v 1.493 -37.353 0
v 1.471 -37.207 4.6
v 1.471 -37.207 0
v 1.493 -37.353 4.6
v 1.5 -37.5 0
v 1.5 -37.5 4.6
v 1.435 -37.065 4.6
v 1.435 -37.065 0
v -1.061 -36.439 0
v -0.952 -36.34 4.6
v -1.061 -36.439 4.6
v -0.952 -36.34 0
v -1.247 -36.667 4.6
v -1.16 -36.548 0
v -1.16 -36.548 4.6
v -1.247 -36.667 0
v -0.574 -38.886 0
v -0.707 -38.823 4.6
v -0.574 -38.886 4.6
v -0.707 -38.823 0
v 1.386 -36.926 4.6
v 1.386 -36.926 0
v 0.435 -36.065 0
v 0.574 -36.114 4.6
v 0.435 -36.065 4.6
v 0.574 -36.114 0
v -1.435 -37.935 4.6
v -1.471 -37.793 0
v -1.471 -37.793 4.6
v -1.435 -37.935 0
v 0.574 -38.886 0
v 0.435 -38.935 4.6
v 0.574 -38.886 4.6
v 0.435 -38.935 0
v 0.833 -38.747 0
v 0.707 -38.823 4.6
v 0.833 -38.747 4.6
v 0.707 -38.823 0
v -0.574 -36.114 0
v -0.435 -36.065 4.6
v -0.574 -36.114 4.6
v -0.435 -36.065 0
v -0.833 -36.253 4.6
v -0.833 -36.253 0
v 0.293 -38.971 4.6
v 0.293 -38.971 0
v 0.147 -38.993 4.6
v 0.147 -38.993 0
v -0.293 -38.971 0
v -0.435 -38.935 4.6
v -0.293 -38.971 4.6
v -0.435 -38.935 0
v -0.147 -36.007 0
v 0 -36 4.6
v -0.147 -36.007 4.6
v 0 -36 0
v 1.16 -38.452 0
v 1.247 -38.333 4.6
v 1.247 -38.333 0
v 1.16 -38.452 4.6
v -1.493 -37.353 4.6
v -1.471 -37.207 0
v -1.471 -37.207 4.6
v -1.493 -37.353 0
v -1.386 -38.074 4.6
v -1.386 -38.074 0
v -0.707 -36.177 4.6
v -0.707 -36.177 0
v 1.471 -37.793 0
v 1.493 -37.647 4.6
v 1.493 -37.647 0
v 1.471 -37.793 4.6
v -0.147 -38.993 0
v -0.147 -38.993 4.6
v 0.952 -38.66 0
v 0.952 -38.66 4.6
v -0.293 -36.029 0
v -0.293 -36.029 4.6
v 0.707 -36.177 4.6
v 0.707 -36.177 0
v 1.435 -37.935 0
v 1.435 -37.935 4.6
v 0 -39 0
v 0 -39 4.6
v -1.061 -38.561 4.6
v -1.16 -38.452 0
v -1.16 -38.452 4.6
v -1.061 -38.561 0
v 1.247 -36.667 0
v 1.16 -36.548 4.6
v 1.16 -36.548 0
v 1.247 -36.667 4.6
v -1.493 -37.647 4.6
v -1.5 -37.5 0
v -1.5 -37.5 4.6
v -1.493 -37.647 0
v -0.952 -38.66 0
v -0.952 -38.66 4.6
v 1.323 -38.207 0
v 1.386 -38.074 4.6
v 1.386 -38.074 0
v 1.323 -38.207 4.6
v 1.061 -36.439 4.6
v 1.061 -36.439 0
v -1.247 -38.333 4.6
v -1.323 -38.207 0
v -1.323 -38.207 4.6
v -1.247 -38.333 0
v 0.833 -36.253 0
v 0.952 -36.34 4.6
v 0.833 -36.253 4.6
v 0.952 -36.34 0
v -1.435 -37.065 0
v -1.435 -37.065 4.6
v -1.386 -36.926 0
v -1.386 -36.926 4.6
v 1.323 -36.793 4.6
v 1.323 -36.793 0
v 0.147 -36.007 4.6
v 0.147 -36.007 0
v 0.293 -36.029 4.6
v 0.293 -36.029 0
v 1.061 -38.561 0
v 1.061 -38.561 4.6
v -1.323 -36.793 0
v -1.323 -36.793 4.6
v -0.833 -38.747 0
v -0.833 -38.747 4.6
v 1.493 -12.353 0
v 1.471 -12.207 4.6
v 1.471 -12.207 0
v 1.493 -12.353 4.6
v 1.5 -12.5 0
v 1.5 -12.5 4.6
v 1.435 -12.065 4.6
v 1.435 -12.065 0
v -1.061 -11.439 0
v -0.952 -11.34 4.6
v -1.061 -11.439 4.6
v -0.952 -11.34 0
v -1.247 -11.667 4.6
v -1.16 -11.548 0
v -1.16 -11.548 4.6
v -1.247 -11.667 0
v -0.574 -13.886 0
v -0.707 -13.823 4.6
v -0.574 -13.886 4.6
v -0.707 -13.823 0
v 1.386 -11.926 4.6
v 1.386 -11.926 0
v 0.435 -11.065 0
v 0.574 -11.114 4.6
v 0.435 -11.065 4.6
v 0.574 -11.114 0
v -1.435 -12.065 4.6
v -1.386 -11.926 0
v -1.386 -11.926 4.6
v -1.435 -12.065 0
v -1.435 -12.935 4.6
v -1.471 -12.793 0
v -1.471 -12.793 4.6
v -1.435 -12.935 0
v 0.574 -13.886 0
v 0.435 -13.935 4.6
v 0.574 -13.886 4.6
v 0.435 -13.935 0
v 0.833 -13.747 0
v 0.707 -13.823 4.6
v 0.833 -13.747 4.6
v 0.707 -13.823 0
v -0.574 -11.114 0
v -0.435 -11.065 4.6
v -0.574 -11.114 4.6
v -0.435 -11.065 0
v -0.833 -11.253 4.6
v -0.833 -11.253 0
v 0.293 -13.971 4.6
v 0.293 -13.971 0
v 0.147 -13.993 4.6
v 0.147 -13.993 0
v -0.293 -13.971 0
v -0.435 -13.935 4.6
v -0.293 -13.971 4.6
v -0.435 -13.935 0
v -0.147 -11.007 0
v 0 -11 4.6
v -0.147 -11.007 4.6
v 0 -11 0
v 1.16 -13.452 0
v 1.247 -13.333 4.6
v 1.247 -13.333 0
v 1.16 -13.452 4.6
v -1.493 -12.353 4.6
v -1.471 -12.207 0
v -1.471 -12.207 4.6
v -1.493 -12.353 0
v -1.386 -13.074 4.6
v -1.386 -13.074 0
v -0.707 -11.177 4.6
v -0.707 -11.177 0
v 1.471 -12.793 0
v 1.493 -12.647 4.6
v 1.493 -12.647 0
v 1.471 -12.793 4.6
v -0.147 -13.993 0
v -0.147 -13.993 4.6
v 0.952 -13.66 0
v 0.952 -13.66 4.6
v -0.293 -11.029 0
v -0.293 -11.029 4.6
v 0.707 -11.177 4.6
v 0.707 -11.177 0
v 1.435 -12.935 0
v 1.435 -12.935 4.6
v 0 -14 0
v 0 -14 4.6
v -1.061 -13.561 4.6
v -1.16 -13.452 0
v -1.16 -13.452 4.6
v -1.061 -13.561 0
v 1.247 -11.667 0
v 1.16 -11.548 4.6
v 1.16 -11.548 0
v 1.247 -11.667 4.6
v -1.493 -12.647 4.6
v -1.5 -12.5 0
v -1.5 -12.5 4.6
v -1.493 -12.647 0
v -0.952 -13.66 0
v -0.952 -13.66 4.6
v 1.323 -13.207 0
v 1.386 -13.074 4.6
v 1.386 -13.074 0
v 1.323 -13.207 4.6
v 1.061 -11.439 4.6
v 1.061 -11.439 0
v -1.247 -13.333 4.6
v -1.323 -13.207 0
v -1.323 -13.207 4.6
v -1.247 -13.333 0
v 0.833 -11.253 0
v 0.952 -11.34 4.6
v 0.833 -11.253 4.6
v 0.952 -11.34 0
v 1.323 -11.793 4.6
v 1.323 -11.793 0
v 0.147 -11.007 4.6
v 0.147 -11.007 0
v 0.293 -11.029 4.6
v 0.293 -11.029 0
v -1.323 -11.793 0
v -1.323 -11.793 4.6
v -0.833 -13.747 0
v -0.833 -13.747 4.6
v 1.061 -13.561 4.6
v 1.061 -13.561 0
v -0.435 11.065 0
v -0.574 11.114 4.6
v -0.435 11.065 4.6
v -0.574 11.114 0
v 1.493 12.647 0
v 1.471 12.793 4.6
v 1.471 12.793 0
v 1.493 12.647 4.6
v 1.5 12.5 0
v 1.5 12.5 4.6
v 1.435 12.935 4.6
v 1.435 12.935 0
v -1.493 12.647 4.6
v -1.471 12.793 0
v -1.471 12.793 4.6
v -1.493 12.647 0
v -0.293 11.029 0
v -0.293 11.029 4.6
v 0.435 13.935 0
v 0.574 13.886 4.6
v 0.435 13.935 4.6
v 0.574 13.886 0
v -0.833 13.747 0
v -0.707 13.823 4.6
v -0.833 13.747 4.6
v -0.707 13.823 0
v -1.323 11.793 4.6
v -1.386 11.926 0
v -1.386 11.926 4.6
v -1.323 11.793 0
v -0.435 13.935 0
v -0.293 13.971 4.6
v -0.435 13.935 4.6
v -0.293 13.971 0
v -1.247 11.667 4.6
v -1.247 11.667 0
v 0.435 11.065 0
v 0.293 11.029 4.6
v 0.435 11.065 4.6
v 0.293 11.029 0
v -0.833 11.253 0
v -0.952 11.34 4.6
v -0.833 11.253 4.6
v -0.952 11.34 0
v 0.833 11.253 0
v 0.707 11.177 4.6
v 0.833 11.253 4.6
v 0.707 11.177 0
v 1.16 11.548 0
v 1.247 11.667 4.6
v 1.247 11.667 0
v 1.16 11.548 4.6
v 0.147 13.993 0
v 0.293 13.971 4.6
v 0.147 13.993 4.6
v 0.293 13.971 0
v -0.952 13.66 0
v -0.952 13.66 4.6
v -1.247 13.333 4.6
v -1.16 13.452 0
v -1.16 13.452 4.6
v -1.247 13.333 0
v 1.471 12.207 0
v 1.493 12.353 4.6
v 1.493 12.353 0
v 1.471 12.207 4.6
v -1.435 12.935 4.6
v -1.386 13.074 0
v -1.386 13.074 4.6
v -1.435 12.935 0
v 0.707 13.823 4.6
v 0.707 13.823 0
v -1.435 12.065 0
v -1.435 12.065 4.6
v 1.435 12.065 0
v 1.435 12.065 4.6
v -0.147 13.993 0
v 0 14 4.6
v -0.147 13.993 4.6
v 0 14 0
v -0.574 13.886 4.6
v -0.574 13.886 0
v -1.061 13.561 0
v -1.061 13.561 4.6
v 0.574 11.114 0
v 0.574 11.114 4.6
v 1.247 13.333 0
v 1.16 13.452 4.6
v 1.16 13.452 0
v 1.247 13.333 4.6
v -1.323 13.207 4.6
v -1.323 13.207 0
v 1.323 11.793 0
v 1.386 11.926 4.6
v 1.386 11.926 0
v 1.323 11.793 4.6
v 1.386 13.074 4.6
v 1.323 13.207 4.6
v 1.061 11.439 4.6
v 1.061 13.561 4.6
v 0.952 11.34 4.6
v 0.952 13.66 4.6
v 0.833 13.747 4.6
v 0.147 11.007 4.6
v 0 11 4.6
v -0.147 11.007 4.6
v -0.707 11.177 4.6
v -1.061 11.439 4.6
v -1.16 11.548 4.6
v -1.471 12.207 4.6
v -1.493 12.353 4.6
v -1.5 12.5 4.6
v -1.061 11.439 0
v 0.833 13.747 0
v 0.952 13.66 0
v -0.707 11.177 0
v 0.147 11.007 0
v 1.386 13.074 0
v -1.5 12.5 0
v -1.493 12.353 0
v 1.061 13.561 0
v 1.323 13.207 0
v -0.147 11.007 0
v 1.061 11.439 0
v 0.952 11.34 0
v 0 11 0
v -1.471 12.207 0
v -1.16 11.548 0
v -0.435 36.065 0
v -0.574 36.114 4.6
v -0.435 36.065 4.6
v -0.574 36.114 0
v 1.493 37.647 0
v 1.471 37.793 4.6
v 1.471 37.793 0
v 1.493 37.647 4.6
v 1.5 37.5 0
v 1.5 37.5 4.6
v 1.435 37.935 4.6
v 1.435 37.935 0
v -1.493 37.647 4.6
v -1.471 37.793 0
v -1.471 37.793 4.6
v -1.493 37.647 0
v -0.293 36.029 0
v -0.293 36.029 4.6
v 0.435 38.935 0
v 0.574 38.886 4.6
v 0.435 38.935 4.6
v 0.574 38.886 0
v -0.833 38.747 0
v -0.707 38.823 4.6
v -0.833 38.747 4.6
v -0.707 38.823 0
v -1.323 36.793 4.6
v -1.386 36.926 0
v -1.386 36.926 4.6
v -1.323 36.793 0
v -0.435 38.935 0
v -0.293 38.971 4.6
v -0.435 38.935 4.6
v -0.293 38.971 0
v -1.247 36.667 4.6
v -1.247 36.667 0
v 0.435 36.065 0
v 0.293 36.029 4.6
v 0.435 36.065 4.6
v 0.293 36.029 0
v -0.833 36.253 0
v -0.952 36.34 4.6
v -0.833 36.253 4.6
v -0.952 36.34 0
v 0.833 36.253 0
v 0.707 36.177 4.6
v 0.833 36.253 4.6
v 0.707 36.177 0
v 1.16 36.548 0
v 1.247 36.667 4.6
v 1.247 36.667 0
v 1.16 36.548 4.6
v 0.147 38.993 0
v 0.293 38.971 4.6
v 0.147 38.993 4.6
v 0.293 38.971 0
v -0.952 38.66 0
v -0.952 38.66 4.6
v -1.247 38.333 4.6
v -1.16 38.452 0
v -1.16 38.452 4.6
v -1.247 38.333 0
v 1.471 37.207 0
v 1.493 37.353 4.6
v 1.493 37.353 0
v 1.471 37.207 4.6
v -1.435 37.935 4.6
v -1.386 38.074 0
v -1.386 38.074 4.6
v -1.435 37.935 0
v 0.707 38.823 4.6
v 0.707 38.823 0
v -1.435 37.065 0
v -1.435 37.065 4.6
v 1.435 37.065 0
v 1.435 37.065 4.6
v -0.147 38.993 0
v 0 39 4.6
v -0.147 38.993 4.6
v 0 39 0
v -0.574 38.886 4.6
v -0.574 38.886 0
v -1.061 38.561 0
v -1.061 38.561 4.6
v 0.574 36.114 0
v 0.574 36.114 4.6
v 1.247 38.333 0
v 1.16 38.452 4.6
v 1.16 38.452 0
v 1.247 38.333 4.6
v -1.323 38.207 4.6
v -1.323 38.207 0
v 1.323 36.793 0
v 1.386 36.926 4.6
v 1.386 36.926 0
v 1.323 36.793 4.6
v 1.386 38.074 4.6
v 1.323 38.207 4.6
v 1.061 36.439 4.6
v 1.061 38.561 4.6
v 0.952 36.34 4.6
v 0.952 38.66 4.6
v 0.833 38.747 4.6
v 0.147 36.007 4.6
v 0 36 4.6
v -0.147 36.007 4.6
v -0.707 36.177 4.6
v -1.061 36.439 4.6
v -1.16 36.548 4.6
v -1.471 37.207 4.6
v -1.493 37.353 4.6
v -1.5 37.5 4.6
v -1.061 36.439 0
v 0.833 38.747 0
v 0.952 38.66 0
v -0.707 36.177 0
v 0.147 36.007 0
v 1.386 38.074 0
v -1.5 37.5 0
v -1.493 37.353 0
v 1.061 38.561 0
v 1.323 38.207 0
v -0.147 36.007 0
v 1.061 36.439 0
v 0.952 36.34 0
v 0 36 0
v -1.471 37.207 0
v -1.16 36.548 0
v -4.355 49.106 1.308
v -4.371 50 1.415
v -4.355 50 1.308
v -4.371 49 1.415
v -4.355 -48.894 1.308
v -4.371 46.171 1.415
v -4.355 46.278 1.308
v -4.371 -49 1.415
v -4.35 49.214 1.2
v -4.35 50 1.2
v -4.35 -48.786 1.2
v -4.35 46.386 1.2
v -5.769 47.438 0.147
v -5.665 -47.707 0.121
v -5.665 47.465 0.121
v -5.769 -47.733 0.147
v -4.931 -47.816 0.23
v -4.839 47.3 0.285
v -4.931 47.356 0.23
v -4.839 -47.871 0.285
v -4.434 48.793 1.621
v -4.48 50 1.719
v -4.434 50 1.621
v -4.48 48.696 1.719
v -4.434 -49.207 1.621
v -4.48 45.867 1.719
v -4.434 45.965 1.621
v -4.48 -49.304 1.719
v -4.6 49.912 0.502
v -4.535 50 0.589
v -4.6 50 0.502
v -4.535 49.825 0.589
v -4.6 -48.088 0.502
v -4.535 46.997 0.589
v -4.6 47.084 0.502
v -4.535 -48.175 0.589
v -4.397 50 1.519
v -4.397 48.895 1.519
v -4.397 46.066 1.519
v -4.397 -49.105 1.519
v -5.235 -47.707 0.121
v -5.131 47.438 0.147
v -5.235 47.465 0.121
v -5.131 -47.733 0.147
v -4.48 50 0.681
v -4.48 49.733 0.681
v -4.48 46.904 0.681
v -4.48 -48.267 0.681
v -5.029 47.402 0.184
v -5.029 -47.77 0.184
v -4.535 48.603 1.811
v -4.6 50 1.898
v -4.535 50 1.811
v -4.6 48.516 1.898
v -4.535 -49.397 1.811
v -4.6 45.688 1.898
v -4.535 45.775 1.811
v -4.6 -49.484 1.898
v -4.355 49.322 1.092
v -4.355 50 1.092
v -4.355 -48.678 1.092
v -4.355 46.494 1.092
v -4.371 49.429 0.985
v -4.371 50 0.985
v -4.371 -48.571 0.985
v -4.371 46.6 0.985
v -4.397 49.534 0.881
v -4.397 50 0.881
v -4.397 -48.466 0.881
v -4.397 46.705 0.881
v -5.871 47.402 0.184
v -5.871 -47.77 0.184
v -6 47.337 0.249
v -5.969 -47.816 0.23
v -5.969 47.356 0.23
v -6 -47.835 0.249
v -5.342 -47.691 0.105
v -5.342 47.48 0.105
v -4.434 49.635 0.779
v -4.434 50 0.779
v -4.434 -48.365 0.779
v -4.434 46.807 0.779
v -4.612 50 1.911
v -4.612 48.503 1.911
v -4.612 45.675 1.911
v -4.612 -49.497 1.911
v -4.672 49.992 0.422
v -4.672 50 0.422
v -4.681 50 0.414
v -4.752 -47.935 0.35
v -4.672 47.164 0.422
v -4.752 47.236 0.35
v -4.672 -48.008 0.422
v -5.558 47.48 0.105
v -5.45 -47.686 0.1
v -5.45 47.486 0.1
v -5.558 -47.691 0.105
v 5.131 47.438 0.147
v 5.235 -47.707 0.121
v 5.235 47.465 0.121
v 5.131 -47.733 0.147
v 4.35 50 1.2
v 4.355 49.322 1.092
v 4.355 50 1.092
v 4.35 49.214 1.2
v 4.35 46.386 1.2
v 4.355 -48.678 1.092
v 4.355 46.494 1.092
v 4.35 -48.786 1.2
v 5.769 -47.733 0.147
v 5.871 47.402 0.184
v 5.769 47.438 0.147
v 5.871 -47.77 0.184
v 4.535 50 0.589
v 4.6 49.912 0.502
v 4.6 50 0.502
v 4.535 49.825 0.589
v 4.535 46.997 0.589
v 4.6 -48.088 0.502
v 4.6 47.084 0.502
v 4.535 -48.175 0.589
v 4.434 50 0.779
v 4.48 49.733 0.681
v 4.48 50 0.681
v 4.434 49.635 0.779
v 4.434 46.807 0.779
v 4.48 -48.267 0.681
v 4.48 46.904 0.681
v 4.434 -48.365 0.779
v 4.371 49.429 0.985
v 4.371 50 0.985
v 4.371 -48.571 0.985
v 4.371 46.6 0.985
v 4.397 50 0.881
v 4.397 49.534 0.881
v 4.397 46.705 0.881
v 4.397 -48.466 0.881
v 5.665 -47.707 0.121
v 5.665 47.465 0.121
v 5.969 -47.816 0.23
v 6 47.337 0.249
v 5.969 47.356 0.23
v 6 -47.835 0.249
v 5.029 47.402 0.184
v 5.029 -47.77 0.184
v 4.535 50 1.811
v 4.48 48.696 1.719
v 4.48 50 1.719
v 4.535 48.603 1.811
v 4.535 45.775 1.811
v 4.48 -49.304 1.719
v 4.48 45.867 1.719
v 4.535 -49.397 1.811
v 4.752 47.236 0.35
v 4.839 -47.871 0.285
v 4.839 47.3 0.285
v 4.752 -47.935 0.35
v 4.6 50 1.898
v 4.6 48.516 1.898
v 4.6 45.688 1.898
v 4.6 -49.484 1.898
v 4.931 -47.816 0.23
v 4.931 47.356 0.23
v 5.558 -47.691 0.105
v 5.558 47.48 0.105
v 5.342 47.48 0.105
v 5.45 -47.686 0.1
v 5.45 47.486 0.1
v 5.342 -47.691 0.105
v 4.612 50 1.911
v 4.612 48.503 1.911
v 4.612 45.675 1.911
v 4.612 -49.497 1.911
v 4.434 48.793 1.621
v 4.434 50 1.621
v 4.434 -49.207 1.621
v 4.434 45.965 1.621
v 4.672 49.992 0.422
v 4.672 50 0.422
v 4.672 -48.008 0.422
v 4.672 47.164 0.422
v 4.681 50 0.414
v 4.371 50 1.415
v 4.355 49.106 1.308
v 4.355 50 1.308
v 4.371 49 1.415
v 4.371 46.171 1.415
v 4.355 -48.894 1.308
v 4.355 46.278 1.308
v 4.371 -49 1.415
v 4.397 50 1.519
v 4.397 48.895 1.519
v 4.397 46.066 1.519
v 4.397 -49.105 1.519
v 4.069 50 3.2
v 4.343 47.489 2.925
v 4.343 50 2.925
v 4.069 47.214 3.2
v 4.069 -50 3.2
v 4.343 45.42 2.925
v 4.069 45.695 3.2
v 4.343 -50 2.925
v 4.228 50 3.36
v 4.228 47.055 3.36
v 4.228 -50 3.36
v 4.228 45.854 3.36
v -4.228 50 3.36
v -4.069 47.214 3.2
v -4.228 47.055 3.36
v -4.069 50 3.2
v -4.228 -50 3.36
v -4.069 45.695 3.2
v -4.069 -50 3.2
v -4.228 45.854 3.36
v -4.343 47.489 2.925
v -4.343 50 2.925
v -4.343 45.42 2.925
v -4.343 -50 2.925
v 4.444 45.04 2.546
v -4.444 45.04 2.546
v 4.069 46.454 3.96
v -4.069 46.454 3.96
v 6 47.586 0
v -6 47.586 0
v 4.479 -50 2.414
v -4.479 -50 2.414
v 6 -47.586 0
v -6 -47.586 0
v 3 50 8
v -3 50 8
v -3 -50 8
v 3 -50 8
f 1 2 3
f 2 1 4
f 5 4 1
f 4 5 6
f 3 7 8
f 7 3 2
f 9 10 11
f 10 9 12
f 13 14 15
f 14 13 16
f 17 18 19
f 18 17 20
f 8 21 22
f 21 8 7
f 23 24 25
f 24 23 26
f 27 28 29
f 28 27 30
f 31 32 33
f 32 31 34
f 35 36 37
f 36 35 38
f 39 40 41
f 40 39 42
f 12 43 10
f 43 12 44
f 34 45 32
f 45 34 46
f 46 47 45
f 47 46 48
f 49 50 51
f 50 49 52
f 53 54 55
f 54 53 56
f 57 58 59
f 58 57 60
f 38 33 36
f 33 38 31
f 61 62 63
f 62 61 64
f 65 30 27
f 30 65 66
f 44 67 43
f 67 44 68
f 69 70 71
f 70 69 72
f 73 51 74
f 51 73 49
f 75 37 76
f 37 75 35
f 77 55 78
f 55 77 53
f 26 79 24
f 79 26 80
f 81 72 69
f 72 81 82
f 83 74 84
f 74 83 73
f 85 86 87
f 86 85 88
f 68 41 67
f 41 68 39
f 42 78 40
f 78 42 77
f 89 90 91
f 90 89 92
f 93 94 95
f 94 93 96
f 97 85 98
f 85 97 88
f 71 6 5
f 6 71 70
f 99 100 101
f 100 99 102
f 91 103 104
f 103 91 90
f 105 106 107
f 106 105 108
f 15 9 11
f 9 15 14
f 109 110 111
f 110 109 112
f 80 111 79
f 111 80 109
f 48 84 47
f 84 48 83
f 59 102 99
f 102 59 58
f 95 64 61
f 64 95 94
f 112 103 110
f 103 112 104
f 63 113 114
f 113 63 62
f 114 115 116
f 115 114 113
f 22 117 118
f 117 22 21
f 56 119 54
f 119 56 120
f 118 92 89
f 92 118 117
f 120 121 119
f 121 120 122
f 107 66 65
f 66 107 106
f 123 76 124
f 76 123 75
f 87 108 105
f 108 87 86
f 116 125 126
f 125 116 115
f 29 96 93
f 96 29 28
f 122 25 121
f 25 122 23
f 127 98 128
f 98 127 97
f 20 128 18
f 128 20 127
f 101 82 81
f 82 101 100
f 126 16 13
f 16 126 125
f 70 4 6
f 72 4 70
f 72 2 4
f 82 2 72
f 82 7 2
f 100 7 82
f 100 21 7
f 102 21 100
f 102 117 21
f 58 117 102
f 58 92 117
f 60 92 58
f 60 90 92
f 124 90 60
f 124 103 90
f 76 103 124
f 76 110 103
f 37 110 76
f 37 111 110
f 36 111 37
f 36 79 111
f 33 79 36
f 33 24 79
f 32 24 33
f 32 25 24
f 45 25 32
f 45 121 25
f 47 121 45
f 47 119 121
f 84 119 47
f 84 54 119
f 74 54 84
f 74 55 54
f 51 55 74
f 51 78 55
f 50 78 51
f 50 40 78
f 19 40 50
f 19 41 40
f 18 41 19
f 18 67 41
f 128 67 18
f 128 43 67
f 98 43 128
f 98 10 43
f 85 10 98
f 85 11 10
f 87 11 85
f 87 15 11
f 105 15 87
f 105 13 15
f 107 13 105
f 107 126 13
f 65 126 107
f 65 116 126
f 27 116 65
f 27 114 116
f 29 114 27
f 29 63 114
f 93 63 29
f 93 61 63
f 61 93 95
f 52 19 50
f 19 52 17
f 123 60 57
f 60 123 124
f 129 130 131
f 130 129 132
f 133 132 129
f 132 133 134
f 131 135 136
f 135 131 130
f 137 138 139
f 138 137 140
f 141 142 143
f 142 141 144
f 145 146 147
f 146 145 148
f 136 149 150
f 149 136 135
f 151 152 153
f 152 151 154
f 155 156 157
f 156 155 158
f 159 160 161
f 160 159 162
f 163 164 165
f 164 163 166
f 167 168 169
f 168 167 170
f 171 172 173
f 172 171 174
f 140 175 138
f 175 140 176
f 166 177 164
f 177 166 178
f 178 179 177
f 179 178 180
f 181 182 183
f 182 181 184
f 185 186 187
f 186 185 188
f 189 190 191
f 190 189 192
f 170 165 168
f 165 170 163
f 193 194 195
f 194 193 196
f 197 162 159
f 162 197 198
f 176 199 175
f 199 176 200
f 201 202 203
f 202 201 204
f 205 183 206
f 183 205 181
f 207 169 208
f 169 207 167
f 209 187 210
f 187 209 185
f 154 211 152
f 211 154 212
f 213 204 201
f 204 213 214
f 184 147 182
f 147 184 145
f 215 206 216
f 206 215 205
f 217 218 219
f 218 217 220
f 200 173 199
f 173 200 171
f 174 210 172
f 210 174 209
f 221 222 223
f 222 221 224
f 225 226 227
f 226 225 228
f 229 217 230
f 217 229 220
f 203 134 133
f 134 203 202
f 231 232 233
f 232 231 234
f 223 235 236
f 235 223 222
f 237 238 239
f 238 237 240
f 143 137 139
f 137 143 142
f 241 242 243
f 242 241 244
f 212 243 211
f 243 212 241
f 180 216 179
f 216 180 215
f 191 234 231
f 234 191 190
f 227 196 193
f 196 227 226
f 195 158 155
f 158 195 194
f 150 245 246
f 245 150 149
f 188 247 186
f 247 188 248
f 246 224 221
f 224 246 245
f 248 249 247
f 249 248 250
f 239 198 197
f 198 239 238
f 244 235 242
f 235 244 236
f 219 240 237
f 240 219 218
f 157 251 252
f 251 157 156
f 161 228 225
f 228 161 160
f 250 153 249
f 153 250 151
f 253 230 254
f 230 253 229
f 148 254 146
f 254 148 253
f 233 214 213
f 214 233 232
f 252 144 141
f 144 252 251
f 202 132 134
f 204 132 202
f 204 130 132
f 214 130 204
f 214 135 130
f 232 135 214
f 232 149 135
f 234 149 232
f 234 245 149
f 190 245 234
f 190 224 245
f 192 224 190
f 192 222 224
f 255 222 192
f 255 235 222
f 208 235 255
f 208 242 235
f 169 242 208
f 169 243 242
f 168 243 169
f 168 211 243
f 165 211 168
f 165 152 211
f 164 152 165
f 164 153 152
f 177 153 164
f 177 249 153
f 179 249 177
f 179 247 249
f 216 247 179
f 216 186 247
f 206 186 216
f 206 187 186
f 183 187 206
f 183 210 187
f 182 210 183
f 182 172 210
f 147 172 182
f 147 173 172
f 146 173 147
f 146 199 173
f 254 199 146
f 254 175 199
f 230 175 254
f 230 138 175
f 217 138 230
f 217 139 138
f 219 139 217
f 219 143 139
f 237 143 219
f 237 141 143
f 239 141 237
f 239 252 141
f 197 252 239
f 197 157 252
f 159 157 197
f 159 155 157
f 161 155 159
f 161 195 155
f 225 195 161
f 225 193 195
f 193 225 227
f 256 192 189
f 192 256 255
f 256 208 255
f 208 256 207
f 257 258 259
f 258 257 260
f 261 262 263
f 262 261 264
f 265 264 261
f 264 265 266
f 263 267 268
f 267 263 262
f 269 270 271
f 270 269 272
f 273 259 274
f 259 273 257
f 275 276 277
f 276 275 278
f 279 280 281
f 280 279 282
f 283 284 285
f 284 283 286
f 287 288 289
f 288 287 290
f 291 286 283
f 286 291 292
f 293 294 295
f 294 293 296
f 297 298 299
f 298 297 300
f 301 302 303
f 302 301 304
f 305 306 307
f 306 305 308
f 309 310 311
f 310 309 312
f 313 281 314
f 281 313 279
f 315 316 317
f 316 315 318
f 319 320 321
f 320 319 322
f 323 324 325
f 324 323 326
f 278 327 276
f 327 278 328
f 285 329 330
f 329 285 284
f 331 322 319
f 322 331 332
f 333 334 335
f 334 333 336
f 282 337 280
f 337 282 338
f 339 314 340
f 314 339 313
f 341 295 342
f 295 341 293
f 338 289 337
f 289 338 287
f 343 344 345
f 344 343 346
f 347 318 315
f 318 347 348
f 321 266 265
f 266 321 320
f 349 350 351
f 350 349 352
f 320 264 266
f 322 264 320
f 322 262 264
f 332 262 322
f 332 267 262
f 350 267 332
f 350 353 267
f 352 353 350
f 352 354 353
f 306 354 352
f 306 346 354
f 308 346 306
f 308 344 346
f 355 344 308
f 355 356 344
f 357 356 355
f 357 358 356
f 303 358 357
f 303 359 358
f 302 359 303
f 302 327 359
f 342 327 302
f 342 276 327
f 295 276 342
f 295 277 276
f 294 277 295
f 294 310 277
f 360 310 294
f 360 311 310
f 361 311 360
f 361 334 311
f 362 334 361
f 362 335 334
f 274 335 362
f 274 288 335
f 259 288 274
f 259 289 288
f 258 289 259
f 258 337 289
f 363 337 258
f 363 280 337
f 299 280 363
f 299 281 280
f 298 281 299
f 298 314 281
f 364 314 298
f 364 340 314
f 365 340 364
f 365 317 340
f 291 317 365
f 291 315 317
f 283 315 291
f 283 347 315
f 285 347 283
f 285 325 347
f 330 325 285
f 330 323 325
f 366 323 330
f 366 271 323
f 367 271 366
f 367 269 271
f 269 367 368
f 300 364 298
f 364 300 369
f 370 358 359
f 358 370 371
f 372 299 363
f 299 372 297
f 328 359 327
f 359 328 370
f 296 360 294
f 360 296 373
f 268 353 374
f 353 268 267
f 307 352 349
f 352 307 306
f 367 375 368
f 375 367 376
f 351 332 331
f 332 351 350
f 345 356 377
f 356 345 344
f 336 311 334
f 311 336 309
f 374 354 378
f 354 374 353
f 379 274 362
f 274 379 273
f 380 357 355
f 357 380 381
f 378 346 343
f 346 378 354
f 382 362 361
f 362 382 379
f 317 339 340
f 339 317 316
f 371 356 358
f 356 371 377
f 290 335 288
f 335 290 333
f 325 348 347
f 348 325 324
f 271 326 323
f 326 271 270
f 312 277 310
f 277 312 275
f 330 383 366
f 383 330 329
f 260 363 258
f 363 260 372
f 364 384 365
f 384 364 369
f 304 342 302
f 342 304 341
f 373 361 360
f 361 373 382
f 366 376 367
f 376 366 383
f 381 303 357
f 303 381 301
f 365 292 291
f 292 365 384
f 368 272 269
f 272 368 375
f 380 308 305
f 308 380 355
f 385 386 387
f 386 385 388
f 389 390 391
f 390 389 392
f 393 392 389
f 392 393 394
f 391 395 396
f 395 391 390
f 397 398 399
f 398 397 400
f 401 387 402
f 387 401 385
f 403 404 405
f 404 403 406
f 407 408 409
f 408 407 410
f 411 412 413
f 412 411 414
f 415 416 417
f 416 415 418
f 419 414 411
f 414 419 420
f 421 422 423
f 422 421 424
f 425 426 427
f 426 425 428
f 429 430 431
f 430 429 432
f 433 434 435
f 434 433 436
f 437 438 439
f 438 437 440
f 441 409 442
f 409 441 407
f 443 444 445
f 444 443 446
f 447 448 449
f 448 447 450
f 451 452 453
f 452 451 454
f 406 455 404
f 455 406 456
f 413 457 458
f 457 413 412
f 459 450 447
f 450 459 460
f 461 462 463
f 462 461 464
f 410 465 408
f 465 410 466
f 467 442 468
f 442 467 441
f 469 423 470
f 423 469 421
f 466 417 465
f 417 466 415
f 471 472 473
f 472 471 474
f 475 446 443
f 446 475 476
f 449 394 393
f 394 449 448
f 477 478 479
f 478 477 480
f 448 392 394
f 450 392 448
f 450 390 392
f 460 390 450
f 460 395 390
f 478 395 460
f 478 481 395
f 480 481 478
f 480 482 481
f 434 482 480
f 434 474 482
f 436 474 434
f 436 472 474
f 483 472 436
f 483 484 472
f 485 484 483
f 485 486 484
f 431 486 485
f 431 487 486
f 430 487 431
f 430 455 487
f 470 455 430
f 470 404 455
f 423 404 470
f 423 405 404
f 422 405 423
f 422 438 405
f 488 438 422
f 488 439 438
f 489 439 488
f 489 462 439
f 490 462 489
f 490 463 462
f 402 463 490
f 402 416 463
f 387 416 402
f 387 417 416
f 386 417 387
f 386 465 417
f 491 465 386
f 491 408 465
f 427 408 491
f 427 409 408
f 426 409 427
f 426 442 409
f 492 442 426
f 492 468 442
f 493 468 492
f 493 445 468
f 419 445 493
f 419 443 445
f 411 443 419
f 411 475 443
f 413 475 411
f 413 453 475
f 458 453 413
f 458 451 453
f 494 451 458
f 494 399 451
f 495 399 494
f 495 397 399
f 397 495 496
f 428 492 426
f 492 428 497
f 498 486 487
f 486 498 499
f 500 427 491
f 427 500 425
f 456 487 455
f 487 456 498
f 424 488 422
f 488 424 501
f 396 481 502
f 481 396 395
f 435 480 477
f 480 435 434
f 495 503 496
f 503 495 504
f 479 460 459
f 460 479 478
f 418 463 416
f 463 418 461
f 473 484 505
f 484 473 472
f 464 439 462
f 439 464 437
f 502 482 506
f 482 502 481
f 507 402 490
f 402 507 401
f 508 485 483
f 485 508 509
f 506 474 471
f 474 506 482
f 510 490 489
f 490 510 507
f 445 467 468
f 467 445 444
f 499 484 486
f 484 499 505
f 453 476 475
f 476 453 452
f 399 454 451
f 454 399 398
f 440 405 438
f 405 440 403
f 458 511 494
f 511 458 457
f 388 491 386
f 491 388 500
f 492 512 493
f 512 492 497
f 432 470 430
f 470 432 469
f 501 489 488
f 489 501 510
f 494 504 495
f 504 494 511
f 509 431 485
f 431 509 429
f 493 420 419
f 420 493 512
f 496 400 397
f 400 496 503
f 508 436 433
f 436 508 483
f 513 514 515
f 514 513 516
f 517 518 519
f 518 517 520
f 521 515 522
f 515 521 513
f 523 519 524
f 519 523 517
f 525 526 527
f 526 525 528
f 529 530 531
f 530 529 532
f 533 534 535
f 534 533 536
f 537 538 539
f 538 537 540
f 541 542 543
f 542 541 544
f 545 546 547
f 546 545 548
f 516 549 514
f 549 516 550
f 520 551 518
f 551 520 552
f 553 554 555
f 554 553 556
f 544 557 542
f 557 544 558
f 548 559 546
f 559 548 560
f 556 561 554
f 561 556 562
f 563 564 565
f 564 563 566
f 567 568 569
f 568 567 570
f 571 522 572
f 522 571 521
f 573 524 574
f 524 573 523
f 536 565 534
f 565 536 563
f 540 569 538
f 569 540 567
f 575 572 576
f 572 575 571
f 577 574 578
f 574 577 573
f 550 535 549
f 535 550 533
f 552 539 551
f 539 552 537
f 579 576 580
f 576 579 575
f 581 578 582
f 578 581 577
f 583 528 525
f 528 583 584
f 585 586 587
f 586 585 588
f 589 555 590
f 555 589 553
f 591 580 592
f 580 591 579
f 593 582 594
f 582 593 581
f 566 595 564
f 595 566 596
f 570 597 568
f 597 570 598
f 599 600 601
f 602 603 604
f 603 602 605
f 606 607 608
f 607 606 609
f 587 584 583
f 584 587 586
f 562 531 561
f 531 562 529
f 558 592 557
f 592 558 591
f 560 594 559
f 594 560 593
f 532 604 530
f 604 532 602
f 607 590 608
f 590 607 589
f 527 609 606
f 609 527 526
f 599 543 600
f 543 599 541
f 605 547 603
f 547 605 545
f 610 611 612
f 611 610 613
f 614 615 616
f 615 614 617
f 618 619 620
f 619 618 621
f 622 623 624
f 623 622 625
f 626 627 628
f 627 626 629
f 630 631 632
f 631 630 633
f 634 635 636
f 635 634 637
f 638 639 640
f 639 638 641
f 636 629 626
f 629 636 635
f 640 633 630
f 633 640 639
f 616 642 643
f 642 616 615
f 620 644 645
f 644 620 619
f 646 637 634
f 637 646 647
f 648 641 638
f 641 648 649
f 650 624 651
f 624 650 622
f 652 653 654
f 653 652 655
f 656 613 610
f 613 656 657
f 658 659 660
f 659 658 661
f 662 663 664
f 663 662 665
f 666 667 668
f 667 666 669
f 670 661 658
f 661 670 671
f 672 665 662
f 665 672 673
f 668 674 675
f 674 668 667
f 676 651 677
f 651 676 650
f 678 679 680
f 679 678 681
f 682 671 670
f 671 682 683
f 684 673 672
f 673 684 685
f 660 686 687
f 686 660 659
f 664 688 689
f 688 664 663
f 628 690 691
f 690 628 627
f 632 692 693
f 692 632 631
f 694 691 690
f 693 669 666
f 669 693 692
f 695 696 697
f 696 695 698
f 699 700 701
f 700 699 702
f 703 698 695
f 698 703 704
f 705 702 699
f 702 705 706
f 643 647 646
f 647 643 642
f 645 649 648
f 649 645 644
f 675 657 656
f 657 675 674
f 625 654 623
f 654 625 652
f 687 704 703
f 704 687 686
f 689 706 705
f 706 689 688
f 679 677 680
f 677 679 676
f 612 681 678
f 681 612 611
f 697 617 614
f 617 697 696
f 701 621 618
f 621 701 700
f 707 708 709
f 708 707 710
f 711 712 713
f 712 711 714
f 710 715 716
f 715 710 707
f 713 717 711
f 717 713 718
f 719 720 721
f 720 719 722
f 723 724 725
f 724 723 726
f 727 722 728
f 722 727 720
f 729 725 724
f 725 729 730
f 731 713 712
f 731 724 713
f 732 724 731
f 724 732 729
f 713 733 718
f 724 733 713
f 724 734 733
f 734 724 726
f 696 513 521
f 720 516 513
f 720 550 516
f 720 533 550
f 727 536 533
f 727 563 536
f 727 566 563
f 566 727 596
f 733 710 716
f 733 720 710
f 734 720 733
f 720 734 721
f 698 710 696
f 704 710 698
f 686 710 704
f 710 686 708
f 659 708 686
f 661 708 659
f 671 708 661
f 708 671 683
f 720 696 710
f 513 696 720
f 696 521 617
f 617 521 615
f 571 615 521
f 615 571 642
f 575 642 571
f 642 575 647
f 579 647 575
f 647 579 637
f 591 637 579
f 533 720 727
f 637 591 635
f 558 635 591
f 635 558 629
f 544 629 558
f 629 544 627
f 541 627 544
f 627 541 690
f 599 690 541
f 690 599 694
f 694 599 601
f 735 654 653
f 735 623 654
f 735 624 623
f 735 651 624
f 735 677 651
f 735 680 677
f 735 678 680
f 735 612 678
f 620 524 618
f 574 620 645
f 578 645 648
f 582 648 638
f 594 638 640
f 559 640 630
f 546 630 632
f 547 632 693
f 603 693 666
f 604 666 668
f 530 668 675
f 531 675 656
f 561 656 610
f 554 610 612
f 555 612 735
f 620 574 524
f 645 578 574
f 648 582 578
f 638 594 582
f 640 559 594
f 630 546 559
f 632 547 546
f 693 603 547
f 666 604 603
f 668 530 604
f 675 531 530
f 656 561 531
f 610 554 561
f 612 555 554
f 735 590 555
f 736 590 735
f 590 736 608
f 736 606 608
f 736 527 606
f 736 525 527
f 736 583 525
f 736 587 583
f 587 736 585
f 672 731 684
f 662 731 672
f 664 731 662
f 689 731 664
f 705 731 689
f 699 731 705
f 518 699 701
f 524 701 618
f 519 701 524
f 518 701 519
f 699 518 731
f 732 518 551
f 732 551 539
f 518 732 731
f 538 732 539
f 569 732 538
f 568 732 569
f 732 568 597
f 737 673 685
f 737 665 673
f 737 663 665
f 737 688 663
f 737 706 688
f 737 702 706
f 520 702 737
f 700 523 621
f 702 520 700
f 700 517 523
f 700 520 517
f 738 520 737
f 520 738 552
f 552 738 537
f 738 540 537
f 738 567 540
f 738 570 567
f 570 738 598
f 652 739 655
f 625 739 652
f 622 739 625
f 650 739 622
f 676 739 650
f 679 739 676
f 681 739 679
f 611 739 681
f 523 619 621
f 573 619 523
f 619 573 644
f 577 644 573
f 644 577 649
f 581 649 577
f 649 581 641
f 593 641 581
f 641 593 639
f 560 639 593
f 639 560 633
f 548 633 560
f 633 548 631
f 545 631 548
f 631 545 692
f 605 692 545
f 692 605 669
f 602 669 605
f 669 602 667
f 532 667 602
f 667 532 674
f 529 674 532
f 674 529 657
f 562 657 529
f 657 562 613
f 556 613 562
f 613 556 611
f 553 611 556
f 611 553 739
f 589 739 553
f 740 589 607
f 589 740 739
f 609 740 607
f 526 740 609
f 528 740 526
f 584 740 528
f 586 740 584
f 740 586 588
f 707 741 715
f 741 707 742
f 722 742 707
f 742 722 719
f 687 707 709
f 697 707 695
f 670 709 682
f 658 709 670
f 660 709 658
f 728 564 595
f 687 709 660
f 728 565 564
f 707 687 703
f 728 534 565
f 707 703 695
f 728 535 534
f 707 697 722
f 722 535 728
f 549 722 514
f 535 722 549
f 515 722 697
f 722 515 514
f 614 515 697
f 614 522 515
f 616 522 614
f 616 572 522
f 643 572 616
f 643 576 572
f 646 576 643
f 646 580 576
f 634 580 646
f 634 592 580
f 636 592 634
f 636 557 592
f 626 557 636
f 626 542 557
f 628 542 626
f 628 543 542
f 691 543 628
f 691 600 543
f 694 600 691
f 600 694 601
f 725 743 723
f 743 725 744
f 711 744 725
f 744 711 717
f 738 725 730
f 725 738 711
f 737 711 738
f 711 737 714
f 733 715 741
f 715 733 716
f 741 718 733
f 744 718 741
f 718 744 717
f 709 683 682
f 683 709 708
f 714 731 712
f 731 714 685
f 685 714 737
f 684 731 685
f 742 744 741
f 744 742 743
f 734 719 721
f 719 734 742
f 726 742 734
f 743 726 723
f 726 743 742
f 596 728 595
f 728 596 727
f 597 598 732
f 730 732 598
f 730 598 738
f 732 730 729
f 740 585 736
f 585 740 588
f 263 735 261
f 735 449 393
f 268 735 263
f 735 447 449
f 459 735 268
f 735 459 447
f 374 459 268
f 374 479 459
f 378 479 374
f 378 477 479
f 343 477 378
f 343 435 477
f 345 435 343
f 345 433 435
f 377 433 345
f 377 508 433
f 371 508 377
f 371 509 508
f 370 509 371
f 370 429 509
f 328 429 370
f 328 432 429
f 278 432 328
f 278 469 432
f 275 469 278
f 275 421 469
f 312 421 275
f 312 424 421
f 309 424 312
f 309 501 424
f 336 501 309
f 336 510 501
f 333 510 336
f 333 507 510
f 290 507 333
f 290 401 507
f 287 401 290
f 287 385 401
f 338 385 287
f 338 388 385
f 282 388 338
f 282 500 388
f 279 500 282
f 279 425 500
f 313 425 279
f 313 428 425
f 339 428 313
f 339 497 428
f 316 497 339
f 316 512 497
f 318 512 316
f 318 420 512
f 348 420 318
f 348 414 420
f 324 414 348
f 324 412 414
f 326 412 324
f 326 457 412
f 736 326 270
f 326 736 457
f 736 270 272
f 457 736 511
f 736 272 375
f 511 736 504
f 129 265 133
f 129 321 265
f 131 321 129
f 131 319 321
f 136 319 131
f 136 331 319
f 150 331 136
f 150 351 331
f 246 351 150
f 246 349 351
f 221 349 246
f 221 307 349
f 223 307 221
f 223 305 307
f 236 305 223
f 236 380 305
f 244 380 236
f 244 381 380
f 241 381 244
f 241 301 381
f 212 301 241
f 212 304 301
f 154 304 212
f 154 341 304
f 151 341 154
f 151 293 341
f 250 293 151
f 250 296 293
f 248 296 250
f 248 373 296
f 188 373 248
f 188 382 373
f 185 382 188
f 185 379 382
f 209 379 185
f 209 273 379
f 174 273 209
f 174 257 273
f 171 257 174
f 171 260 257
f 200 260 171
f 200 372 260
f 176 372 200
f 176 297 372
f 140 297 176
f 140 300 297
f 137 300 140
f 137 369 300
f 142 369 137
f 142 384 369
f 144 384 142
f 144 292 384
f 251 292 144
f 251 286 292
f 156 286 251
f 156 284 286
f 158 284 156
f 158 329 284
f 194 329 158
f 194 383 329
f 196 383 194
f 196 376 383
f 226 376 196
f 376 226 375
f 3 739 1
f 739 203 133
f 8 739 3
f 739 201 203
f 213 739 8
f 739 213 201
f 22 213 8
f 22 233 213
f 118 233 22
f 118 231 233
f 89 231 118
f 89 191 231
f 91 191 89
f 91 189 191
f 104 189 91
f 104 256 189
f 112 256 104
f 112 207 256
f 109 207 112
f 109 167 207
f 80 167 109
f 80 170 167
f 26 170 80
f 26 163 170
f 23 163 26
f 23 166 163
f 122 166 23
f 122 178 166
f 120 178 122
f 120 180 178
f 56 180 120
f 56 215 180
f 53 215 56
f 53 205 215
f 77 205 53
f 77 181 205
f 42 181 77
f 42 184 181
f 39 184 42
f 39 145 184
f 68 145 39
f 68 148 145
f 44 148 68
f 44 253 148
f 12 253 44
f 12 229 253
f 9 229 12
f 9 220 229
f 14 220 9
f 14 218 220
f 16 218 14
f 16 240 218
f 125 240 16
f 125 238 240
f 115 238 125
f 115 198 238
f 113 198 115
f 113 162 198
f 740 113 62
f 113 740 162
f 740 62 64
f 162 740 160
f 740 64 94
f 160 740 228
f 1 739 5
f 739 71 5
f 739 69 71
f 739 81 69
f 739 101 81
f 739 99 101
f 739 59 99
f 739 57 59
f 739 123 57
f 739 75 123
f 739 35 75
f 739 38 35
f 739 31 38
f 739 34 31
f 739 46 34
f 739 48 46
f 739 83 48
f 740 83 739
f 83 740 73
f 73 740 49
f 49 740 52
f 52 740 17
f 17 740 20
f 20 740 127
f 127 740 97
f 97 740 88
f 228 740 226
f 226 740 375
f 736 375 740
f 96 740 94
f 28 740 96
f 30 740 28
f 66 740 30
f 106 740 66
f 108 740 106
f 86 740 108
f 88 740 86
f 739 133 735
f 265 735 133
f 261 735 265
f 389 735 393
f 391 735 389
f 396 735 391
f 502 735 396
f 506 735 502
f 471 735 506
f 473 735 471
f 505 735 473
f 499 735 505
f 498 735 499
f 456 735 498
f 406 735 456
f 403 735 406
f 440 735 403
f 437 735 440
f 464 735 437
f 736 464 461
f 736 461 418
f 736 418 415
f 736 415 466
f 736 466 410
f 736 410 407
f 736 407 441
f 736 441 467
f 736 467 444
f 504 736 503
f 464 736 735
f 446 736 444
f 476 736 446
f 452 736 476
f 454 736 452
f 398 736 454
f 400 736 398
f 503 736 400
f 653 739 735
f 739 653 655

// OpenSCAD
$fn = 64;

// Miniature linear guide rail (profiled) — 12mm W x 8mm H x 100mm L

// Parameters
rail_length = 100.0; //[50.0:200.0:1]
rail_width  = 12.0;  //[6.0:24.0:0.5]
rail_height = 8.0;   //[4.0:16.0:0.5]

hole_d = 3.0;        //[1.5:6.0:0.1]
hole_spacing = 25.0; //[10.0:60.0:0.5]
hole_end_offset = 12.5; //[6.0:30.0:0.5]
hole_count = 4;      //[2:8:1]

edge_chamfer = 0.8;  //[0.3:2.0:0.1]
end_chamfer  = 1.0;  //[0.3:3.0:0.1]

overlap = 0.6;       //[0.2:2.0:0.1]

// Profile details (kept within 12x8 envelope)
top_flat_w = 6.0;    // top land width
side_step_h = 1.2;   // height of side step from bottom
side_step_in = 1.2;  // inset of side step from outer width

race_r = 1.1;        // raceway groove radius
race_depth = 0.55;   // how far groove cuts into side
race_z = 5.2;        // groove center height from bottom (0..rail_height)

function clamp(v, lo, hi) = min(max(v, lo), hi);

// Derived / clamped to ensure valid geometry
top_flat_w_c = clamp(top_flat_w, 0.5, rail_width - 2*edge_chamfer - 0.2);
side_step_h_c = clamp(side_step_h, 0.2, rail_height - 0.8);
side_step_in_c = clamp(side_step_in, 0.2, rail_width/2 - top_flat_w_c/2 - 0.2);

race_r_c = clamp(race_r, 0.4, 2.5);
race_depth_c = clamp(race_depth, 0.1, rail_width/2 - 0.6);
race_z_c = clamp(race_z, race_r_c + 0.4, rail_height - race_r_c - 0.4);

// 2D cross-section (X-Z), extruded along Y
module rail_profile_2d() {
    // Symmetric stepped profile with a top land
    // Points go CCW
    w = rail_width;
    h = rail_height;

    x0 = -w/2;
    x1 = -w/2 + side_step_in_c;
    x2 = -top_flat_w_c/2;
    x3 =  top_flat_w_c/2;
    x4 =  w/2 - side_step_in_c;
    x5 =  w/2;

    z0 = 0;
    z1 = side_step_h_c;
    z2 = h;

    polygon(points=[
        [x0, z0],
        [x5, z0],
        [x5, z1],
        [x4, z1],
        [x3, z2],
        [x2, z2],
        [x1, z1],
        [x0, z1]
    ]);
}

// Main rail solid (before cuts)
module rail_solid() {
    // Extrude along Y so length is rail_length
    rotate([90,0,0])  // make extrusion axis = Y
        linear_extrude(height=rail_length, center=true, convexity=10)
            rail_profile_2d();
}

// Mounting holes (through height, along Z)
module mounting_holes() {
    for (i = [0:hole_count-1]) {
        y = -rail_length/2 + hole_end_offset + i*hole_spacing;
        translate([0, y, 0])
            cylinder(h=rail_height + 2*overlap, r=hole_d/2, center=true);
    }
}

// Raceway grooves (two side grooves running full length)
module raceway_grooves() {
    // Place groove cylinders so they cut into the sides by race_depth_c
    // Cylinder axis along Y (length direction)
    groove_len = rail_length + 2*overlap;

    // Left groove
    translate([-(rail_width/2 - race_depth_c), 0, -rail_height/2 + race_z_c])
        rotate([90,0,0])
            cylinder(h=groove_len, r=race_r_c, center=true);

    // Right groove
    translate([ (rail_width/2 - race_depth_c), 0, -rail_height/2 + race_z_c])
        rotate([90,0,0])
            cylinder(h=groove_len, r=race_r_c, center=true);
}

// Chamfer cuts using long rotated cubes (kept connected; only subtract)
module edge_chamfer_cuts() {
    // Along Y, at 4 vertical edges of the bounding box
    L = rail_length + 2*overlap;
    c = edge_chamfer;

    // Top edges
    translate([ rail_width/2 - c, 0,  rail_height/2 - c])
        rotate([0,45,0]) cube([2*c, L, 2*c], center=true);
    translate([-rail_width/2 + c, 0,  rail_height/2 - c])
        rotate([0,45,0]) cube([2*c, L, 2*c], center=true);

    // Bottom edges
    translate([ rail_width/2 - c, 0, -rail_height/2 + c])
        rotate([0,45,0]) cube([2*c, L, 2*c], center=true);
    translate([-rail_width/2 + c, 0, -rail_height/2 + c])
        rotate([0,45,0]) cube([2*c, L, 2*c], center=true);
}

module end_chamfer_cuts() {
    // Chamfer the ends (at +/-Y)
    c = end_chamfer;
    W = rail_width + 2*overlap;
    H = rail_height + 2*overlap;

    translate([0,  rail_length/2 - c, 0])
        rotate([45,0,0]) cube([W, 2*c, H], center=true);

    translate([0, -rail_length/2 + c, 0])
        rotate([45,0,0]) cube([W, 2*c, H], center=true);
}

module rail() {
    difference() {
        rail_solid();
        mounting_holes();
        raceway_grooves();
        edge_chamfer_cuts();
        end_chamfer_cuts();
    }
}

rail();
